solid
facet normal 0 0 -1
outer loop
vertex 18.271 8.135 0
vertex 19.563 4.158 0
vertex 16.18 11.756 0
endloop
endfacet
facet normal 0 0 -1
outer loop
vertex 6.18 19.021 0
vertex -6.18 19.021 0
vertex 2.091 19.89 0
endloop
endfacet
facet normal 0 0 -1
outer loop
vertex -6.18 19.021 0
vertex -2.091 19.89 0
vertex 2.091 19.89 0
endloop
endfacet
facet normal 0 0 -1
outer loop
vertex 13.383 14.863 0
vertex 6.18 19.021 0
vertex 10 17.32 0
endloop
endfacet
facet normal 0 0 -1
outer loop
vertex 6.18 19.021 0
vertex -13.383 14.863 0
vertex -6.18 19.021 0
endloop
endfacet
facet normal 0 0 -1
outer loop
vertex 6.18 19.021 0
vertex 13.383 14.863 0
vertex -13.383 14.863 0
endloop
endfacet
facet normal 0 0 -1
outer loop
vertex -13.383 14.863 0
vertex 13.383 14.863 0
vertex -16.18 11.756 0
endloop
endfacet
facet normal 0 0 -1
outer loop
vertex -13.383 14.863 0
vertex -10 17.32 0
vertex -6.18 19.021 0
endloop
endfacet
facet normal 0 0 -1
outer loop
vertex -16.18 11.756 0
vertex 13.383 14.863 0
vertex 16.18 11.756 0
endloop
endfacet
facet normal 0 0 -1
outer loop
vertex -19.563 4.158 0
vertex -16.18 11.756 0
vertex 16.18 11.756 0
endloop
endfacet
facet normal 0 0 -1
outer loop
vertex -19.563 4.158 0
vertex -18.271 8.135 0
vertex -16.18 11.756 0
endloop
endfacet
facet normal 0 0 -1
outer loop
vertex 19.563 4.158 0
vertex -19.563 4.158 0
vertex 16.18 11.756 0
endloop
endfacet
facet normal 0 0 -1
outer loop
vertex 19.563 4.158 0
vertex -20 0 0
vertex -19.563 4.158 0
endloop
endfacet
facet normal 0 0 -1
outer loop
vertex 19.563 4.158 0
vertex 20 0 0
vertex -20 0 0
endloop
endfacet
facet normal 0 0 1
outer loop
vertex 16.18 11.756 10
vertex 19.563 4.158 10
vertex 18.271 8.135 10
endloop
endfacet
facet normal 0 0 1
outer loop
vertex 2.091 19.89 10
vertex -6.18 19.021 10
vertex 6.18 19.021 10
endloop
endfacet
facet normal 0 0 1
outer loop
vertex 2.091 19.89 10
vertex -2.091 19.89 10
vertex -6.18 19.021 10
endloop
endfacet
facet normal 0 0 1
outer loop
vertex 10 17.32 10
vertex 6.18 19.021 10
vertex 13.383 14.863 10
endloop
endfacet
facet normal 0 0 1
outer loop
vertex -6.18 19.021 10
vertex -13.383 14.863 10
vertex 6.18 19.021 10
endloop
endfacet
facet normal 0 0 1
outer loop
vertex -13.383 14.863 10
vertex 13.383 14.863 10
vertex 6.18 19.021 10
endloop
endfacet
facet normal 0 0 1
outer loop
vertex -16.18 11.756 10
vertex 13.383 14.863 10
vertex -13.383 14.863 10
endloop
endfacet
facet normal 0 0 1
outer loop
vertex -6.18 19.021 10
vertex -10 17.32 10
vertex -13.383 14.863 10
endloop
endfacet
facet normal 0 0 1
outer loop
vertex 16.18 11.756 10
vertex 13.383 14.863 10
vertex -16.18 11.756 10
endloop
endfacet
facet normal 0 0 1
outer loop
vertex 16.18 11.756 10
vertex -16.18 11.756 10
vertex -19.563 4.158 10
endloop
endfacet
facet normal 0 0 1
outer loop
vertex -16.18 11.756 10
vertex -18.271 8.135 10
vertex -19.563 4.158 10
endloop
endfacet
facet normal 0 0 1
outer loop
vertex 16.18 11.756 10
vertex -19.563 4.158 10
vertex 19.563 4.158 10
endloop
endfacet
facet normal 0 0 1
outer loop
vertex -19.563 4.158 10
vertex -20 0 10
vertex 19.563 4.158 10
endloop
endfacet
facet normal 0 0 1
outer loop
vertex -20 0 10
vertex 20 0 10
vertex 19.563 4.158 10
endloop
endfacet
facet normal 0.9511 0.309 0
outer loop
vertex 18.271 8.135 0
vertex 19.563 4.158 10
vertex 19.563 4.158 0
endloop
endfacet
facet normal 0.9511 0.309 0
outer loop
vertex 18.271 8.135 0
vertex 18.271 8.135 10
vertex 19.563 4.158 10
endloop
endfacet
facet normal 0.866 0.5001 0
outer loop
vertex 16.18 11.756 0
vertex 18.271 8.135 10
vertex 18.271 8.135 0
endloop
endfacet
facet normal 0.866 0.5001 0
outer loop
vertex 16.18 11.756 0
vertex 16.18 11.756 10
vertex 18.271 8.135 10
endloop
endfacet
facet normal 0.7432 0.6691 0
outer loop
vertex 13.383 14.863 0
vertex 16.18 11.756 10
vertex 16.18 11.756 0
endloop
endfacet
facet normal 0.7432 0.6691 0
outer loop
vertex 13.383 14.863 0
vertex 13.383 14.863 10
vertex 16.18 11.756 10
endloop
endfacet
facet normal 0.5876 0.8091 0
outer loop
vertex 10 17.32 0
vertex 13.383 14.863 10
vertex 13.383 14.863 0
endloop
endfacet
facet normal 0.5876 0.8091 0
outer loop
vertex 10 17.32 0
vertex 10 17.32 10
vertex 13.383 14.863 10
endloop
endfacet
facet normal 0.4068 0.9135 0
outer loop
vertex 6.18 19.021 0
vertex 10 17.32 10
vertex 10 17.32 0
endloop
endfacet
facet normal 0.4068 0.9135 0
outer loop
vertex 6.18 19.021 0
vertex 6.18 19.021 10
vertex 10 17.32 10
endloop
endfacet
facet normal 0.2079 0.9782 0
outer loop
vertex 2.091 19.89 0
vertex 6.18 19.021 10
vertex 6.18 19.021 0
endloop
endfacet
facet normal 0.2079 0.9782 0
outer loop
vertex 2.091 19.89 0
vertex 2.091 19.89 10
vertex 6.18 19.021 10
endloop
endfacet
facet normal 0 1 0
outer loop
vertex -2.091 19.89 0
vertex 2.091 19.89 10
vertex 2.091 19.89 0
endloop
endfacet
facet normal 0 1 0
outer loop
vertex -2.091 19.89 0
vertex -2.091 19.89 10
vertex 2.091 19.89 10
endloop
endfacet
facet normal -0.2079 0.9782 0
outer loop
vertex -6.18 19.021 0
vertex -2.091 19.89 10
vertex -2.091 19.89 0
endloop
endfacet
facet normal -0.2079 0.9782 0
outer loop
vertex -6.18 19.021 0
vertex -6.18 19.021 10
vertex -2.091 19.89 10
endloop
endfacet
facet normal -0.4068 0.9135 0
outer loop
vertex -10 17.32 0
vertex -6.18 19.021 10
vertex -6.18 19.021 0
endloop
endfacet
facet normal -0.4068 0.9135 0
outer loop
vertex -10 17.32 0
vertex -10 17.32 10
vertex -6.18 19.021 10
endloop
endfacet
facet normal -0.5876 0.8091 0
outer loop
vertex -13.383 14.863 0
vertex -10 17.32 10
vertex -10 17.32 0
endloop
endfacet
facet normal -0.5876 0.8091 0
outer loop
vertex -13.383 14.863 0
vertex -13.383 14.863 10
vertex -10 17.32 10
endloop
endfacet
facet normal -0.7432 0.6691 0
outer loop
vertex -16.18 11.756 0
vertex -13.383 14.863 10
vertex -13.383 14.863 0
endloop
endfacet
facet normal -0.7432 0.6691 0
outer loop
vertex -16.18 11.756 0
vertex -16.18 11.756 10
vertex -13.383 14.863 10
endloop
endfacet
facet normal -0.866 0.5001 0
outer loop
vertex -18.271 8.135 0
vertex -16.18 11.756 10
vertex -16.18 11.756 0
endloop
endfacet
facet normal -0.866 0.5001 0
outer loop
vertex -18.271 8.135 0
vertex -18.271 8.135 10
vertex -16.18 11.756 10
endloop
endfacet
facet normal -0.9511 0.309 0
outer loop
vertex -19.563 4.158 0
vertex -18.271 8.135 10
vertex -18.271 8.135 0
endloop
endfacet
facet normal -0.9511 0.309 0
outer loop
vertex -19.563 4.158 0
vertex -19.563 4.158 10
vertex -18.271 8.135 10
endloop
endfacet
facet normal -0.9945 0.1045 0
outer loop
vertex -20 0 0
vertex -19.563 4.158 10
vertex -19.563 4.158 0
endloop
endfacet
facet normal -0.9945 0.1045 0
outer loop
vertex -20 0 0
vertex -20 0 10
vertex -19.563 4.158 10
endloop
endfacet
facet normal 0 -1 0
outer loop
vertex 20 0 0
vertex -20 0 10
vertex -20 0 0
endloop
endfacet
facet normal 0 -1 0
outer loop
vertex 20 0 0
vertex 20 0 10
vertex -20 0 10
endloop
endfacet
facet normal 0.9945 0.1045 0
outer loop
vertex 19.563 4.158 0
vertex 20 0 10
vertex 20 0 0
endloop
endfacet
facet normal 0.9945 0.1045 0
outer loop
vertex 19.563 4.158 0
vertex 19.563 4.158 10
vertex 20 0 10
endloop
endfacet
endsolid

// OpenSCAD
// Unit of length: Unit.INCH
linear_extrude(height = 10.0, center = false, twist = 0.0, scale = 1.0)
{
   intersection()
   {
      circle(d = 40.0, $fa = 12.0, $fs = 2.0, $fn = 0);
      translate(v = [-20.01, 0.0])
      {
         square(size = [40.02, 20.01], center = false);
      }
   }
}
